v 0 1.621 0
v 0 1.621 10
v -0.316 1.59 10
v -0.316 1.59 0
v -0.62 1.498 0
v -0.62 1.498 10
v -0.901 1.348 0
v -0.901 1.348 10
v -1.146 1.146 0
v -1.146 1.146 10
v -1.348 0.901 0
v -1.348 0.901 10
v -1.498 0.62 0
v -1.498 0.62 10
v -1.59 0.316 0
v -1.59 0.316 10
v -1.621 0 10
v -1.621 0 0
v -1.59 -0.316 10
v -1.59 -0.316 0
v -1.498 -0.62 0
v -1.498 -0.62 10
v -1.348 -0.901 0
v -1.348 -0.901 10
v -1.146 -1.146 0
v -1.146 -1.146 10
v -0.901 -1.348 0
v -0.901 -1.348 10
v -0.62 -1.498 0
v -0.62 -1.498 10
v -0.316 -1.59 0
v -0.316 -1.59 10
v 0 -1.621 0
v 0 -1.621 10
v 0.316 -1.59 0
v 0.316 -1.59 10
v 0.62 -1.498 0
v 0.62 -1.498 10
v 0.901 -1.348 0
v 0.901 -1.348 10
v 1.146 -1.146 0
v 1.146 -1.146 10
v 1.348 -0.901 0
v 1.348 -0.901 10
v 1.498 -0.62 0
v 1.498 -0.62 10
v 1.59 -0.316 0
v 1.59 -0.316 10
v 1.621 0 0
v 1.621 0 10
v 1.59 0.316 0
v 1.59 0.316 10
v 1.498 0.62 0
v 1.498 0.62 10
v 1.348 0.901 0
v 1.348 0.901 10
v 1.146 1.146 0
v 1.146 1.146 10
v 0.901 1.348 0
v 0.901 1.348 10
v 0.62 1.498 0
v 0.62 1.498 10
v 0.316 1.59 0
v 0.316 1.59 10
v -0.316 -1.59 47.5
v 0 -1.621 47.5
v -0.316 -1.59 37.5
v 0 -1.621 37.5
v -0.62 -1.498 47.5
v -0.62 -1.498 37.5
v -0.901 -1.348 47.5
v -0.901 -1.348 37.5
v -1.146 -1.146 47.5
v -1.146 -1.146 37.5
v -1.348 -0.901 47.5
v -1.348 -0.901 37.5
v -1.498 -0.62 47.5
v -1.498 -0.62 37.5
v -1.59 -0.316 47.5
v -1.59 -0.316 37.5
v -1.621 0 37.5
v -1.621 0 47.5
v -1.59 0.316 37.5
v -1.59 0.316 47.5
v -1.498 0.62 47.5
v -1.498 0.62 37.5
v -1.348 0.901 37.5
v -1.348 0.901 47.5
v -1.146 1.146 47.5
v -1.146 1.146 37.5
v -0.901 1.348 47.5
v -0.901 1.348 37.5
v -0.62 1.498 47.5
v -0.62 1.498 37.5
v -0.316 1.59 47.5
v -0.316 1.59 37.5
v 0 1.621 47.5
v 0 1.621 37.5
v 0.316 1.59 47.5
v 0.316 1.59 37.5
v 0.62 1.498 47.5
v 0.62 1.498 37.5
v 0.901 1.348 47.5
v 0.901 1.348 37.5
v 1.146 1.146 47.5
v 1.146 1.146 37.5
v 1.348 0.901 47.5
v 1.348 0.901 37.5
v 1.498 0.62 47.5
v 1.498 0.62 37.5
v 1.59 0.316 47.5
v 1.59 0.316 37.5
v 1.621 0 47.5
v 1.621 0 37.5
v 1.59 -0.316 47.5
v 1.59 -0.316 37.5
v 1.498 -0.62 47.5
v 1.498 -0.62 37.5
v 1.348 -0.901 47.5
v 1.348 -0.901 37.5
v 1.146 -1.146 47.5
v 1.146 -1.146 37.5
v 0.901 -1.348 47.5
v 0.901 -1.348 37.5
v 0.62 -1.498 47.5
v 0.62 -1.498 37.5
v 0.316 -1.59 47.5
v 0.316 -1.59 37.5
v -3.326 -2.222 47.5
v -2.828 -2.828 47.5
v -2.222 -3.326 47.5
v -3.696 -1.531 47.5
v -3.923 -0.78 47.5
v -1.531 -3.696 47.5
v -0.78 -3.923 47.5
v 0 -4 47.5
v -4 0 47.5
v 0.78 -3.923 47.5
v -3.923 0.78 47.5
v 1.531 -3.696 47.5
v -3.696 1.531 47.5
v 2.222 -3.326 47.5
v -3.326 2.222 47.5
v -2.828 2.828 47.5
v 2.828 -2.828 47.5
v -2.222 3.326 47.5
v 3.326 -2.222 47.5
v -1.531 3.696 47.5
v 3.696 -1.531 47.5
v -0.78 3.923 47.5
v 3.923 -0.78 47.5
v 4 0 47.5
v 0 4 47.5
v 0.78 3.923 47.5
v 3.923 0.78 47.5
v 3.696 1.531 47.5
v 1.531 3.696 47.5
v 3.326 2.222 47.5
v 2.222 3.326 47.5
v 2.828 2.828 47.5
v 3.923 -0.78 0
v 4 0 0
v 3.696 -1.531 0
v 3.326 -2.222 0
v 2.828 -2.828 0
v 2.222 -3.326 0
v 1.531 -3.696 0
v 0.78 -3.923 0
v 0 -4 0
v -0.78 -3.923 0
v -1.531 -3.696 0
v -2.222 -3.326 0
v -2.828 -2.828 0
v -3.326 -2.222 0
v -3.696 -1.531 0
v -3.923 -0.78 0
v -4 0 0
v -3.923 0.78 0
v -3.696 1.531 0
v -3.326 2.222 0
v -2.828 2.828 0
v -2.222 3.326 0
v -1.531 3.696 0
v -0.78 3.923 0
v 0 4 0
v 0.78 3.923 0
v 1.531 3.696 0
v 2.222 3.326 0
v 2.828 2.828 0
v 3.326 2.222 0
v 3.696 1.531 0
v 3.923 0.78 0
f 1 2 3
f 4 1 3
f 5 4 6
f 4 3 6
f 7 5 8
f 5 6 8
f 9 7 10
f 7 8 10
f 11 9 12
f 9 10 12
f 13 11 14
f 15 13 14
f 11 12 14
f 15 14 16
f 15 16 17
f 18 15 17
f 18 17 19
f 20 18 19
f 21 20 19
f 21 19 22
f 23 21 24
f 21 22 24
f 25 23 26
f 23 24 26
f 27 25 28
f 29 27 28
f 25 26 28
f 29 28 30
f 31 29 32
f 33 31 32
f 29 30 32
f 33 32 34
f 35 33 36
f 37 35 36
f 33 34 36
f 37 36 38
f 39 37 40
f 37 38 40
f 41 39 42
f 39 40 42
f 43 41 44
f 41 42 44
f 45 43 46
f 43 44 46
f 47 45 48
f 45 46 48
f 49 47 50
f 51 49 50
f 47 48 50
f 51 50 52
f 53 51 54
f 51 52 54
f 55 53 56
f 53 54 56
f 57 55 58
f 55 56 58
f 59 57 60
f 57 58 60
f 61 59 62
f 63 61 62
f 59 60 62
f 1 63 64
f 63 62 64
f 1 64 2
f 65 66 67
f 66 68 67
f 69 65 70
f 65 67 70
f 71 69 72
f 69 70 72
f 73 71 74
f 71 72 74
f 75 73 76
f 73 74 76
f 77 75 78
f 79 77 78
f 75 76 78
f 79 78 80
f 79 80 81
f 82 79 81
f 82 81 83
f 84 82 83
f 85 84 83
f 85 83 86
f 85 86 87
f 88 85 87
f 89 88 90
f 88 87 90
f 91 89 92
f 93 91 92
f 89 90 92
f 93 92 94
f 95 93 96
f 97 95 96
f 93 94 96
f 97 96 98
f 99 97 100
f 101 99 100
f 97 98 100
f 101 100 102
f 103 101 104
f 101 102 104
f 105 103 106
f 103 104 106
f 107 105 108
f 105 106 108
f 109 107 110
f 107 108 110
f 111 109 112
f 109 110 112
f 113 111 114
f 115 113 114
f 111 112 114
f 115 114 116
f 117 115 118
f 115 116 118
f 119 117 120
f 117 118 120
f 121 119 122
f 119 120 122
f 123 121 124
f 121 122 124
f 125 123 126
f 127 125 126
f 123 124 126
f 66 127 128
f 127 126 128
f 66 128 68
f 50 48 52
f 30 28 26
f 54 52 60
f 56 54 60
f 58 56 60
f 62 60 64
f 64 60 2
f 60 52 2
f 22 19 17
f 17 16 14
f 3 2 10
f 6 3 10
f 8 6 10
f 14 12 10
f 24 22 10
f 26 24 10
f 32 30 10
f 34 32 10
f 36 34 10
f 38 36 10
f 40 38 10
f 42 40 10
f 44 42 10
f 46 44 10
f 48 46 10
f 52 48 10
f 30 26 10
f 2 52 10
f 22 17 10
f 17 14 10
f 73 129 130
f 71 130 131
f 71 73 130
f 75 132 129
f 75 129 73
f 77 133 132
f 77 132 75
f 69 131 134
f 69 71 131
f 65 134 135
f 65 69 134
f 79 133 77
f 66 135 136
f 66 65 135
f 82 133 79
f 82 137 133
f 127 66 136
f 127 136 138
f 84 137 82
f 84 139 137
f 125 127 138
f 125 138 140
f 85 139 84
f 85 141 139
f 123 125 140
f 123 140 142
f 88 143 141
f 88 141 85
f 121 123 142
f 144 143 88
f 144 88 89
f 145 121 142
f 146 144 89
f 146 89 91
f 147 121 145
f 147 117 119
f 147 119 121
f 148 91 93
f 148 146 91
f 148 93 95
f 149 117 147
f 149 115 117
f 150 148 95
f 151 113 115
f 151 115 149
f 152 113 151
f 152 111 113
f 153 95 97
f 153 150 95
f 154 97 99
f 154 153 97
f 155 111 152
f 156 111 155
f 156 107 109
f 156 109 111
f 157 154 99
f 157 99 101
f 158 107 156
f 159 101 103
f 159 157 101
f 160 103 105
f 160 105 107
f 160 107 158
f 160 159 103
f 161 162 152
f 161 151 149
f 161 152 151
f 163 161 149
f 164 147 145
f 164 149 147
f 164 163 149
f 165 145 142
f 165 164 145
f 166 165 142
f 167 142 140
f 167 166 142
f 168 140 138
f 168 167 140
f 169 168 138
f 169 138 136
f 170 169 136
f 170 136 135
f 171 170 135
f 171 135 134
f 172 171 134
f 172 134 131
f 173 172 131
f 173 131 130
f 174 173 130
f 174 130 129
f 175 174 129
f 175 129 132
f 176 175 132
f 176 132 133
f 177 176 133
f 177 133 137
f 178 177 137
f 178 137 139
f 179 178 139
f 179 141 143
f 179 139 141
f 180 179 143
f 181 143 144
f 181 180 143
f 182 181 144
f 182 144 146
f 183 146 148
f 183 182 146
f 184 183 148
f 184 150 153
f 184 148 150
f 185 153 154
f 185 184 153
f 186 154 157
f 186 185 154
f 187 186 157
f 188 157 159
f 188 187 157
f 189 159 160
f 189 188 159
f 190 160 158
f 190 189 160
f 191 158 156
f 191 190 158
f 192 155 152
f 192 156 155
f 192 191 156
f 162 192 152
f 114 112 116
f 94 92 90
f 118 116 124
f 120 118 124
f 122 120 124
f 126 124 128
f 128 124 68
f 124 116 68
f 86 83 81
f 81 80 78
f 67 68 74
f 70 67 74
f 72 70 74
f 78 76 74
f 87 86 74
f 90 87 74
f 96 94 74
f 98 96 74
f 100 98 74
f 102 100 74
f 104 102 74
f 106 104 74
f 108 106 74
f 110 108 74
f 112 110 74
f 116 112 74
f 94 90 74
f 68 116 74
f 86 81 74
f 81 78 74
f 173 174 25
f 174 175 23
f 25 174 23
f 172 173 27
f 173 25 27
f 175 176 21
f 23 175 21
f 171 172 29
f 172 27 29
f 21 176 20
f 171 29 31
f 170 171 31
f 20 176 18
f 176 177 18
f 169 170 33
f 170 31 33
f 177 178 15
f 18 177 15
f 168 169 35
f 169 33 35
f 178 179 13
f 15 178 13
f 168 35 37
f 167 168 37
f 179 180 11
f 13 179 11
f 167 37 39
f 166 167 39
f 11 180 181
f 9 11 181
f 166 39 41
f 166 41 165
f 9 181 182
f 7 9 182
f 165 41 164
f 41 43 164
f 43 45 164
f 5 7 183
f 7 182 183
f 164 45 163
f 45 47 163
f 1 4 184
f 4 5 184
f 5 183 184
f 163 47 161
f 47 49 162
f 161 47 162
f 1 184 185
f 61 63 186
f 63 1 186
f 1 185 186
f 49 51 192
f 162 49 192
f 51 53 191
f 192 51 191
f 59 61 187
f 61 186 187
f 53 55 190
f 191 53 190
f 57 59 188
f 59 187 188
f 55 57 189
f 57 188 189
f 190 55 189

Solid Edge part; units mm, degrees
sketch "Sketch1" plane through (0, 0, 0) normal (0, 0, 1) x (1, 0, 0)
  circle A0 centre (0, 0) radius 4
extrude "Protrusion1" add sketch "Sketch1" along normal blind 47.5
hole "Hole_3" at (0, 0, 0) direction (0, 0, 1) diameter 3.242 depth 10 thread major 4 thread length 8
hole "Hole_4" at (0, 0, 47.5) direction (0, 0, -1) diameter 3.242 depth 10 thread major 4 thread length 8
